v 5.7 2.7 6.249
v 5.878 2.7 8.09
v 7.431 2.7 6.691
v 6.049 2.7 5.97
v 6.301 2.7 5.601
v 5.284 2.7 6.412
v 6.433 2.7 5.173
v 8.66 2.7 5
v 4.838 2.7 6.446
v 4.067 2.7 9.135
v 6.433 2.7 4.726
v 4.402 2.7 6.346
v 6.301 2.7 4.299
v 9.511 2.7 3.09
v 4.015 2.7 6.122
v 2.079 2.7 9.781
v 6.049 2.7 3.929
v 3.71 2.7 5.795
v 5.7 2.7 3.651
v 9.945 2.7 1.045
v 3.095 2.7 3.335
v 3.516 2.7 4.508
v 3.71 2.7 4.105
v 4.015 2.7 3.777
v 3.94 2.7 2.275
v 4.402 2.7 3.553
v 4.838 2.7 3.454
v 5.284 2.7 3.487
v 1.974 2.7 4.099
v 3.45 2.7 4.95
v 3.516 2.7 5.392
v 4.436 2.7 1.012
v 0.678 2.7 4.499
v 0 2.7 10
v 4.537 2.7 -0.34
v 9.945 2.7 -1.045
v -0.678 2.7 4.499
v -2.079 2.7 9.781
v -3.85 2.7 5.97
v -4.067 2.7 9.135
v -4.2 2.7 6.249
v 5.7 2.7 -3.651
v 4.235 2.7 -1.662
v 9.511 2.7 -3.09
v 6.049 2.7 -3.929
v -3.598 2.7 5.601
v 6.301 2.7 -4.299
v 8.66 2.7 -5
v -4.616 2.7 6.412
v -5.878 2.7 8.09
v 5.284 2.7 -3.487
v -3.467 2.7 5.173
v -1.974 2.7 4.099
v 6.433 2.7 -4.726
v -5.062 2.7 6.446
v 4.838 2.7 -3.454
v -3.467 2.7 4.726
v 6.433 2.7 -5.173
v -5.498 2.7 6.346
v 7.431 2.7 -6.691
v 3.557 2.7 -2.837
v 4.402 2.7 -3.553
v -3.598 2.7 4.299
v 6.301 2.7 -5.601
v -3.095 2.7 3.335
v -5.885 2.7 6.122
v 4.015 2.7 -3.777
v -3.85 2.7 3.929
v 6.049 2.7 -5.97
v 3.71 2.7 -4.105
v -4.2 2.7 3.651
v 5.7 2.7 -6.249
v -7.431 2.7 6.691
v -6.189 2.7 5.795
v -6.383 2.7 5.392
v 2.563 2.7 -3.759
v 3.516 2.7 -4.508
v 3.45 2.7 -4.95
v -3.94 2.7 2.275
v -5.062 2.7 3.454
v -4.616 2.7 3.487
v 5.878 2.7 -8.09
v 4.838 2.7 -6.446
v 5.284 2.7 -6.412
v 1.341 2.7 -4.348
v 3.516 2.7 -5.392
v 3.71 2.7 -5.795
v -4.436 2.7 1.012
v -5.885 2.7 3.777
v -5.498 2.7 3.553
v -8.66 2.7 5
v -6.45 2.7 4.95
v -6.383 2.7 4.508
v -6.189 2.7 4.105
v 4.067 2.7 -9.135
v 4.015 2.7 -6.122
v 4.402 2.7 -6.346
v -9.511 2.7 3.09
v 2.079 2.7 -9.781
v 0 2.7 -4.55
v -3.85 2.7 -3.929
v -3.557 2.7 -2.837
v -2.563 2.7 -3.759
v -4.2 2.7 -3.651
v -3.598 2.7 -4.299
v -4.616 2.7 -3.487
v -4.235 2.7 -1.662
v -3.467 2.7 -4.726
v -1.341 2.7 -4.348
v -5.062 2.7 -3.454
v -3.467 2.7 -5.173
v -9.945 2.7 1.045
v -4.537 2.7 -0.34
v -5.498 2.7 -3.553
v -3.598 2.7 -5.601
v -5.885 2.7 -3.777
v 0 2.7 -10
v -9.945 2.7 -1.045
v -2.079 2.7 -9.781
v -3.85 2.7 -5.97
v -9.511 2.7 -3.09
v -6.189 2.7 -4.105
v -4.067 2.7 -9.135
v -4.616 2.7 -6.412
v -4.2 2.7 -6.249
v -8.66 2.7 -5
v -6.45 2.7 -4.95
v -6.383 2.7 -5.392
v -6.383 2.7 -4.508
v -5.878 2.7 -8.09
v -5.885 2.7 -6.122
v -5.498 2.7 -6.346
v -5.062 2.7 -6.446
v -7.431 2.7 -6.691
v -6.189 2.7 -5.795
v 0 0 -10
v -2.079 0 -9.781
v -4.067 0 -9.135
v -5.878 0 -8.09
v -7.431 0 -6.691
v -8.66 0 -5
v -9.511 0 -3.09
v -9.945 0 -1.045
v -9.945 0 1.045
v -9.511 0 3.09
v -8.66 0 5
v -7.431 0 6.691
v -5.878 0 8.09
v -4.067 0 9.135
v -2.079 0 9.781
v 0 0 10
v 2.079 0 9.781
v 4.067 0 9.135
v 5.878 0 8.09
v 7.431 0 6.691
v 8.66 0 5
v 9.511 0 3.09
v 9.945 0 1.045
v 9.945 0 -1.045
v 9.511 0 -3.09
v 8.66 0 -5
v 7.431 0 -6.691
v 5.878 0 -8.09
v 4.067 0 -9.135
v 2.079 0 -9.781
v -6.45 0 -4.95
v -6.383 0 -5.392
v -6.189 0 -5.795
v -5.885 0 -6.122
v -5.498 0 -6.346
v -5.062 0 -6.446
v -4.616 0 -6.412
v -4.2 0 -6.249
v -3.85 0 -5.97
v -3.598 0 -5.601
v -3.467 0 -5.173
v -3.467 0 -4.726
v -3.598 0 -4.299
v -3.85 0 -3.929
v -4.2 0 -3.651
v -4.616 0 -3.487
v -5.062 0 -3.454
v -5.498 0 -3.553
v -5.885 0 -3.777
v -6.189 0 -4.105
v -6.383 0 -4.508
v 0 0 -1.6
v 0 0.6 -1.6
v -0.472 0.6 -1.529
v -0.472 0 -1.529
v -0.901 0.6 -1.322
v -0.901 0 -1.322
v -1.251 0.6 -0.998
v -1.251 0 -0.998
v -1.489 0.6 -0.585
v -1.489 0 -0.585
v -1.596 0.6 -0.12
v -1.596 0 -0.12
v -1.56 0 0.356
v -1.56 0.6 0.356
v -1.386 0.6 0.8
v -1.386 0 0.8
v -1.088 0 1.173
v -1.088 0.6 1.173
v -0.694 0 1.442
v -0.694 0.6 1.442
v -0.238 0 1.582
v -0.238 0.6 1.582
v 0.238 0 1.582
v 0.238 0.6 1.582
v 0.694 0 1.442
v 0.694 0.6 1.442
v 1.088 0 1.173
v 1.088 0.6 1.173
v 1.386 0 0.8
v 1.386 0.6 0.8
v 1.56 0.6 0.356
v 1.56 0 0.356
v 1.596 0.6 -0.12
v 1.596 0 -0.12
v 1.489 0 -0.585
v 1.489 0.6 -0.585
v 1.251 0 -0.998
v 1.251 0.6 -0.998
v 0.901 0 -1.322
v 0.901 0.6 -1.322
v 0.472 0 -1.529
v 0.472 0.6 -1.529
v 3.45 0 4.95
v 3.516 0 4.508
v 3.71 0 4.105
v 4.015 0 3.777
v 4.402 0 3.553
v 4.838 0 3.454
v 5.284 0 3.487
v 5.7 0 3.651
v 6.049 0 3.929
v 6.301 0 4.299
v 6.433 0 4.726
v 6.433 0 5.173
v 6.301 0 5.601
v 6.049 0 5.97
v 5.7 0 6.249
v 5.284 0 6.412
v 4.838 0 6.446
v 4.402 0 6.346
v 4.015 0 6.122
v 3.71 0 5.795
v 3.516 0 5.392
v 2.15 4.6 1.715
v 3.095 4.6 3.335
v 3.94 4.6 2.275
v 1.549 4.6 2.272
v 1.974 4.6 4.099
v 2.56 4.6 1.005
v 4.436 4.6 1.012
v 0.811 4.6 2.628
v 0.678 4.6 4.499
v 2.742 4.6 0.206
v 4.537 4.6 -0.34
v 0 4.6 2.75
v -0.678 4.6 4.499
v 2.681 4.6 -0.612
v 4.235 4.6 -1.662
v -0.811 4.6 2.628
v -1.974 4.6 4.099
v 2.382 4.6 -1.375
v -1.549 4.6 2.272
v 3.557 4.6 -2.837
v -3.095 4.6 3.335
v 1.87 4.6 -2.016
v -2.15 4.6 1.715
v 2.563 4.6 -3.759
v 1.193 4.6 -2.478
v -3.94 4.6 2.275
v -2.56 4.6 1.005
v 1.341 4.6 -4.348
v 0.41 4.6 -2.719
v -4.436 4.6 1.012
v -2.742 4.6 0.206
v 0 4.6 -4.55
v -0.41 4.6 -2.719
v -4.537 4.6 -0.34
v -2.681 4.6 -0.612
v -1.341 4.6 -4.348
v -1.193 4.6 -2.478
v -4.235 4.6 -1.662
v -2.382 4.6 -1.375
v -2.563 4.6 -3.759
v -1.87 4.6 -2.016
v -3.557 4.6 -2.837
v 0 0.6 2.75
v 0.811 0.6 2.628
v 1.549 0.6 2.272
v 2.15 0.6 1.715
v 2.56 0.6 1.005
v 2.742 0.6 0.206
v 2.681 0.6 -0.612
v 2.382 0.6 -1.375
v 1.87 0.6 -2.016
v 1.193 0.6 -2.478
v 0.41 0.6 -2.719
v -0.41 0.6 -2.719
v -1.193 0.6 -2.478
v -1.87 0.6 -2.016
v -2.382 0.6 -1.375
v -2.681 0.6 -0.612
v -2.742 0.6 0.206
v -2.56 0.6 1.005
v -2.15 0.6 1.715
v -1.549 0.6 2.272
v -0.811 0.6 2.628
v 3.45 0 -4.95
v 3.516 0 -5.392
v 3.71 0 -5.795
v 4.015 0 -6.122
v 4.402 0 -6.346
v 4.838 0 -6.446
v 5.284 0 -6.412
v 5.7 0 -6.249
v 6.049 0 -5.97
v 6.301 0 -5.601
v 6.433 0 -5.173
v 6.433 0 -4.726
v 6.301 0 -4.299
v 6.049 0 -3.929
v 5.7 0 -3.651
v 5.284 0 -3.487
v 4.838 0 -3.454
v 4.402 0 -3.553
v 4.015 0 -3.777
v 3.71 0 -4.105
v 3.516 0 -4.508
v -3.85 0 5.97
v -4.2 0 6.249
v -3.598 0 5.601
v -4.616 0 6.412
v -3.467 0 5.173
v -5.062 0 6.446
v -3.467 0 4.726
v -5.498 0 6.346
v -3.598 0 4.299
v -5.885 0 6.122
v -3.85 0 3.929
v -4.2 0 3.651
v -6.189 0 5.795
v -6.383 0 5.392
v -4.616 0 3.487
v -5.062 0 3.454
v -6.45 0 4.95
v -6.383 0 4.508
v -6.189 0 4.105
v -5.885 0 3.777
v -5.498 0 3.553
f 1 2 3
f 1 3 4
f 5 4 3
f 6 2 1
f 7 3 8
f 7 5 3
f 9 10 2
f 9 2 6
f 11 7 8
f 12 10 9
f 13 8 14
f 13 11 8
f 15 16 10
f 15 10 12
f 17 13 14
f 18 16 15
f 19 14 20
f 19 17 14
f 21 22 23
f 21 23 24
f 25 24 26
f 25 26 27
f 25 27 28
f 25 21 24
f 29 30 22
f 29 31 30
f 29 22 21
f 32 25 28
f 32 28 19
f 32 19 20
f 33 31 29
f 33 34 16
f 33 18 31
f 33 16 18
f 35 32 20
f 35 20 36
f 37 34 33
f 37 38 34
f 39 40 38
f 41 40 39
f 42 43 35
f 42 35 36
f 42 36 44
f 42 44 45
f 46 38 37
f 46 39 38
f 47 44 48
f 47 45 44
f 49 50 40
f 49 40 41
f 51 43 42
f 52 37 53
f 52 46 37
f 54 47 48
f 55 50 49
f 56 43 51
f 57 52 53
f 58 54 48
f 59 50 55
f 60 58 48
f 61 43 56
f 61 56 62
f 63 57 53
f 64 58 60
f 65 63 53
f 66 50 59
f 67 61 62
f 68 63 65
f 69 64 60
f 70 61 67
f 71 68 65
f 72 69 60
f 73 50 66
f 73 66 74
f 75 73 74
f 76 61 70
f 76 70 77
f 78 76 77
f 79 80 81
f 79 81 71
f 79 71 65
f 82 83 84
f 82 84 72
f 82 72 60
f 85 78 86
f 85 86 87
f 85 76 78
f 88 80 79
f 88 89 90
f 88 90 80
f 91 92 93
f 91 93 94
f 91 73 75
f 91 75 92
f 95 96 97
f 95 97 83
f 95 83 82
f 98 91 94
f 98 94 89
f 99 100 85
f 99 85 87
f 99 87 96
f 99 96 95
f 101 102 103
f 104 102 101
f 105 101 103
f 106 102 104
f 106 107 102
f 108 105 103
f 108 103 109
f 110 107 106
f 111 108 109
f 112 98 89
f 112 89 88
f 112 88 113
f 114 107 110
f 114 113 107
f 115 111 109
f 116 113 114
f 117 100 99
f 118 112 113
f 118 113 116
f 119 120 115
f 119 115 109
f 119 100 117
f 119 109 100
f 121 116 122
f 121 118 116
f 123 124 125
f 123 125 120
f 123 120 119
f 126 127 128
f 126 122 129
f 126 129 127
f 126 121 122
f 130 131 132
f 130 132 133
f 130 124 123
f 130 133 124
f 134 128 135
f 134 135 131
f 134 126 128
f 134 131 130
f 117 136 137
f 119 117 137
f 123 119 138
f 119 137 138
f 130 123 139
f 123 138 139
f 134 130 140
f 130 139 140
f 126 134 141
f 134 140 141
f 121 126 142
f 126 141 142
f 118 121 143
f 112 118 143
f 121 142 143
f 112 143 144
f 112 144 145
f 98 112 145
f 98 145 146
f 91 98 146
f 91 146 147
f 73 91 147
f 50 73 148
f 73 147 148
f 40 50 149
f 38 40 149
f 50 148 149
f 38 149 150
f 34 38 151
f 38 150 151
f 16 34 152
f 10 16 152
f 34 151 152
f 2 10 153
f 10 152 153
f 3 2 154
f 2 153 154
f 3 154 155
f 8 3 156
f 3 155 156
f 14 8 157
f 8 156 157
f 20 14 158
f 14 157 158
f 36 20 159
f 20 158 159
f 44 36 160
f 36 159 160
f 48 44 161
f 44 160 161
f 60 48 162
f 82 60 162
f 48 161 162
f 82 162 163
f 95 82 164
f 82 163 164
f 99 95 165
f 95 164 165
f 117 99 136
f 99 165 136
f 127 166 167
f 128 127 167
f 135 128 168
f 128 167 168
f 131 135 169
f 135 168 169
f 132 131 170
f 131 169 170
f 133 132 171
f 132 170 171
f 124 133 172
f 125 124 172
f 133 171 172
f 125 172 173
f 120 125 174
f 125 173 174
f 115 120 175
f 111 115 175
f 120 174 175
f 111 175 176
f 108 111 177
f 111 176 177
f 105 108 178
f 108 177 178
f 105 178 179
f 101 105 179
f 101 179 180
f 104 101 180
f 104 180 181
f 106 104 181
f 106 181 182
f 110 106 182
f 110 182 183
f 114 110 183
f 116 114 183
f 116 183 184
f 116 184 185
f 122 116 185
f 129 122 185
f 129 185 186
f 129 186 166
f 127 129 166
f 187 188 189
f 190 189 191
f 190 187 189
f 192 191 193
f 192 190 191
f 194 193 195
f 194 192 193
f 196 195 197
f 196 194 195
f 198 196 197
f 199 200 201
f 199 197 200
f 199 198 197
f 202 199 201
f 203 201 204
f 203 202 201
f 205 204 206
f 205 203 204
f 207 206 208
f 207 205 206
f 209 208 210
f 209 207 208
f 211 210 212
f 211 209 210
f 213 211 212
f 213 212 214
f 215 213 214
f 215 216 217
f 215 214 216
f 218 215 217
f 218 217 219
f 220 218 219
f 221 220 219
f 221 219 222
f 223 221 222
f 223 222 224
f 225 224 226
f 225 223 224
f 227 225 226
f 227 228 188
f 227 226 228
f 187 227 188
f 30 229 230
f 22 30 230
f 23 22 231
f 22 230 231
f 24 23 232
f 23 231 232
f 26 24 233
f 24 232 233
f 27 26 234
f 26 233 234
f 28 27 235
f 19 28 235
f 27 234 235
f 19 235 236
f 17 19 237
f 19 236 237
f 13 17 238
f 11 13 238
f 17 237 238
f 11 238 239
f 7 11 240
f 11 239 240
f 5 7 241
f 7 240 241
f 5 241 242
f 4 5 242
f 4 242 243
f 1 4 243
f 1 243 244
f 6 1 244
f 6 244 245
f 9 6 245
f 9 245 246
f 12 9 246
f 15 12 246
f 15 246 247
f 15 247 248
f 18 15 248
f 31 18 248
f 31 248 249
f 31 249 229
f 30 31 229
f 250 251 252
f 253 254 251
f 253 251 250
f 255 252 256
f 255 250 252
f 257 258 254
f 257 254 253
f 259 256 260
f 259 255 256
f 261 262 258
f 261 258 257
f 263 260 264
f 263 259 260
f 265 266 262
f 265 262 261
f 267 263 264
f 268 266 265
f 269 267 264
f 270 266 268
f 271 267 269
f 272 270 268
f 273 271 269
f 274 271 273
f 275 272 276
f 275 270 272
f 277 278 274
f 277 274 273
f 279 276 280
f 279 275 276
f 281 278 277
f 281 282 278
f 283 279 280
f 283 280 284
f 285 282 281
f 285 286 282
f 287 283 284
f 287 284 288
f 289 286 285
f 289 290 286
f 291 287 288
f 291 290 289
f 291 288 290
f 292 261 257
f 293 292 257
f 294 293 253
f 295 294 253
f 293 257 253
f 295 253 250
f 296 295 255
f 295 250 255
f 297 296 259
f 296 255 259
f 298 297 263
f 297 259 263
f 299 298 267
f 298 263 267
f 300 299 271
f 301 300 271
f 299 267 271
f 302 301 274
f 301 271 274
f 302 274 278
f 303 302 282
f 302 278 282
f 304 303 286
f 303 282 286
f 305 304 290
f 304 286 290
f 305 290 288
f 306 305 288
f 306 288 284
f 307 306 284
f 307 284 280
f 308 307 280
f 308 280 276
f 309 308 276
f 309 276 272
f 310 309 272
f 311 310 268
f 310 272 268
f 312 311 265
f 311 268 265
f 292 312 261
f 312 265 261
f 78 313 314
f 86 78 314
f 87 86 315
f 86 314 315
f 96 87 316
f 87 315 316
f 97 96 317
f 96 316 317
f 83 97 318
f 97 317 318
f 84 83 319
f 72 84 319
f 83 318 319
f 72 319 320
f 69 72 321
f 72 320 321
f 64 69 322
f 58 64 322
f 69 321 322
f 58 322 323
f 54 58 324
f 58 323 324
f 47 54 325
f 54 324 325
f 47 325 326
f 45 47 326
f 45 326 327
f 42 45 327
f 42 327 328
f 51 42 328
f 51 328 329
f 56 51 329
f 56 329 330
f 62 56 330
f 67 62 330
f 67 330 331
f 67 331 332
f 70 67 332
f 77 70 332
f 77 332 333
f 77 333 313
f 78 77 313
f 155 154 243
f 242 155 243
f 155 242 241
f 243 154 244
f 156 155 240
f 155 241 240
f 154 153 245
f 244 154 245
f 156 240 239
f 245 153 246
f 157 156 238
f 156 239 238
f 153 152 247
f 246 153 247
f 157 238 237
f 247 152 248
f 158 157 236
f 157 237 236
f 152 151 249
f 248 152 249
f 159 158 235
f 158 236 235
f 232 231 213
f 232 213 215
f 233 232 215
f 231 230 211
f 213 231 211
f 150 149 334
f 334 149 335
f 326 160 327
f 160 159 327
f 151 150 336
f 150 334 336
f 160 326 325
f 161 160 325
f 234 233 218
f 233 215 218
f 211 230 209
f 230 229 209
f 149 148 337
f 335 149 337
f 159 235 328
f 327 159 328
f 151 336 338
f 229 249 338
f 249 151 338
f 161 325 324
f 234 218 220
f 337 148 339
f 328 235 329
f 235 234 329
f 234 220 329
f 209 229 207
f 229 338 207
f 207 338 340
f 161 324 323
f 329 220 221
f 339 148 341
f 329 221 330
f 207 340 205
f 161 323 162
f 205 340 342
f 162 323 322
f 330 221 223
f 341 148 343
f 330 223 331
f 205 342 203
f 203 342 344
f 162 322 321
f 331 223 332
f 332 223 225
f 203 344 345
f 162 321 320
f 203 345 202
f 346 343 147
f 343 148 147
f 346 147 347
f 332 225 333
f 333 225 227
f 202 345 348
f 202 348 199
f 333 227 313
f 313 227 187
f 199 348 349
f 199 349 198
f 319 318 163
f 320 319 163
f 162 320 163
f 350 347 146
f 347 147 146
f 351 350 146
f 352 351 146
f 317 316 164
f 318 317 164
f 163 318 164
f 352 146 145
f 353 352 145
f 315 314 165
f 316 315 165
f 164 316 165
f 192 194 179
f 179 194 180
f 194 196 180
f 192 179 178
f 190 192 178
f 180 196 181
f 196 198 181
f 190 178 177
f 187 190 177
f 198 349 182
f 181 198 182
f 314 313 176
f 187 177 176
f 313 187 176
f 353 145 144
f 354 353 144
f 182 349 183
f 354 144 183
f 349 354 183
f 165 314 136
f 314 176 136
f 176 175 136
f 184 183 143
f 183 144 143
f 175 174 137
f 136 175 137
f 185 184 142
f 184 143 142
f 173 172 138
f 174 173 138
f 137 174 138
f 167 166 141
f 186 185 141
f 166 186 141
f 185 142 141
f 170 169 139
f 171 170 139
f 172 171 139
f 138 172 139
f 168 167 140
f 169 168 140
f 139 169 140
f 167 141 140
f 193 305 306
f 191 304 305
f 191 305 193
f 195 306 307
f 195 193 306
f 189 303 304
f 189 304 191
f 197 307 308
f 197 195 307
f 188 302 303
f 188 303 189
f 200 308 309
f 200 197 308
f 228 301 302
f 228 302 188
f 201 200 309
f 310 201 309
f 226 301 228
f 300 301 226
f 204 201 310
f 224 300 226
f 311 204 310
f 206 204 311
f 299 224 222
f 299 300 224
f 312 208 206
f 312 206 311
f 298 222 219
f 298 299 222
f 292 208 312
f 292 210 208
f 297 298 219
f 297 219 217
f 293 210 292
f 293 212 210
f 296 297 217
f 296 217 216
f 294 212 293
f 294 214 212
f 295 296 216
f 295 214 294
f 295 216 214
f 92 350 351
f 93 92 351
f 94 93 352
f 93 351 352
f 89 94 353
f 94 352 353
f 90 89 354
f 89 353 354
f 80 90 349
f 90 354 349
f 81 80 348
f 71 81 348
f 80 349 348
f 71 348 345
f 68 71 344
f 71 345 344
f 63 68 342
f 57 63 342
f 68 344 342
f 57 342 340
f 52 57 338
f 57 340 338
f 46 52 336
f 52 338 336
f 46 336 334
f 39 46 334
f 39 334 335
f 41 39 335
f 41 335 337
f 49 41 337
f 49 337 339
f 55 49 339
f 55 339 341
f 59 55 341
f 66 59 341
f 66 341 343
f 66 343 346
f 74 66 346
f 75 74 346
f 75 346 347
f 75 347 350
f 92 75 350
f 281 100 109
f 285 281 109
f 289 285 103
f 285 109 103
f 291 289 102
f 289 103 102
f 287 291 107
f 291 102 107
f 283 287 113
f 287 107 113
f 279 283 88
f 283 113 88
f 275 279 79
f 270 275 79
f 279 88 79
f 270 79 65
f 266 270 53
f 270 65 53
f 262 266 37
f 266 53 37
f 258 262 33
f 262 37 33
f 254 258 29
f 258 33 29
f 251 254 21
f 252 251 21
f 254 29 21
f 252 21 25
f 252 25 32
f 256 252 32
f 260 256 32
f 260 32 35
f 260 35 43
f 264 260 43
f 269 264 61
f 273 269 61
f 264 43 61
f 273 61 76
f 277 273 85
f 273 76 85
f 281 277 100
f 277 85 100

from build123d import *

# Parameters (mm, degrees)
ESQUISSE1_R                   = 10
ESQUISSE1_R_2                 = 1.6
BOSS_EXTRU_1_DEPTH            = 2.7
ESQUISSE2_R                   = 4.55
BOSS_EXTRU_2_DEPTH            = 1.9
ESQUISSE5_R                   = 2.75
ENL_V_MAT_EXTRU_1_DEPTH       = 4
DIAM_TRE_DU_PER_AGE_3_0_3_1_D = 3


with BuildPart() as part:
    # Esquisse1 → Boss.-Extru.1 (new body)
    with BuildSketch(Plane(origin=(0, 0, 0), x_dir=(1, 0, 0), z_dir=(0, 1, 0))):
        with Locations(Location((0, 0, 0), (0, 0, 90))):
            Circle(ESQUISSE1_R)
        with Locations(Location((0, 0, 0), (0, 0, 90))):
            Circle(ESQUISSE1_R_2, mode=Mode.SUBTRACT)
    extrude(amount=BOSS_EXTRU_1_DEPTH)

    # Esquisse2 → Boss.-Extru.2 (add)
    with BuildSketch(Plane(origin=(0, 2.7, 0), x_dir=(1, 0, 0), z_dir=(0, 1, 0))):
        with Locations(Location((0, 0, 0), (0, 0, 90))):
            Circle(ESQUISSE2_R)
    extrude(amount=BOSS_EXTRU_2_DEPTH)

    # Esquisse5 → Enlèv. mat.-Extru.1 (cut)
    with BuildSketch(Plane(origin=(0, 4.6, 0), x_dir=(1, 0, 0), z_dir=(0, 1, 0))):
        with Locations(Location((0, 0, 0), (0, 0, 270))):
            Circle(ESQUISSE5_R)
    extrude(amount=-ENL_V_MAT_EXTRU_1_DEPTH, mode=Mode.SUBTRACT)

    # Diamètre du perçage Ø3.0 (3)1 (through all)
    with Locations(Plane(origin=(0, 2.7, 0), x_dir=(1, 0, 0), z_dir=(0, 1, 0))):
        with Locations((4.949747468, -4.949747468), (-4.949747468, -4.949747468), (-4.949747468, 4.949747468), (4.949747468, 4.949747468)):
            Hole(DIAM_TRE_DU_PER_AGE_3_0_3_1_D / 2)


solid = part.part
